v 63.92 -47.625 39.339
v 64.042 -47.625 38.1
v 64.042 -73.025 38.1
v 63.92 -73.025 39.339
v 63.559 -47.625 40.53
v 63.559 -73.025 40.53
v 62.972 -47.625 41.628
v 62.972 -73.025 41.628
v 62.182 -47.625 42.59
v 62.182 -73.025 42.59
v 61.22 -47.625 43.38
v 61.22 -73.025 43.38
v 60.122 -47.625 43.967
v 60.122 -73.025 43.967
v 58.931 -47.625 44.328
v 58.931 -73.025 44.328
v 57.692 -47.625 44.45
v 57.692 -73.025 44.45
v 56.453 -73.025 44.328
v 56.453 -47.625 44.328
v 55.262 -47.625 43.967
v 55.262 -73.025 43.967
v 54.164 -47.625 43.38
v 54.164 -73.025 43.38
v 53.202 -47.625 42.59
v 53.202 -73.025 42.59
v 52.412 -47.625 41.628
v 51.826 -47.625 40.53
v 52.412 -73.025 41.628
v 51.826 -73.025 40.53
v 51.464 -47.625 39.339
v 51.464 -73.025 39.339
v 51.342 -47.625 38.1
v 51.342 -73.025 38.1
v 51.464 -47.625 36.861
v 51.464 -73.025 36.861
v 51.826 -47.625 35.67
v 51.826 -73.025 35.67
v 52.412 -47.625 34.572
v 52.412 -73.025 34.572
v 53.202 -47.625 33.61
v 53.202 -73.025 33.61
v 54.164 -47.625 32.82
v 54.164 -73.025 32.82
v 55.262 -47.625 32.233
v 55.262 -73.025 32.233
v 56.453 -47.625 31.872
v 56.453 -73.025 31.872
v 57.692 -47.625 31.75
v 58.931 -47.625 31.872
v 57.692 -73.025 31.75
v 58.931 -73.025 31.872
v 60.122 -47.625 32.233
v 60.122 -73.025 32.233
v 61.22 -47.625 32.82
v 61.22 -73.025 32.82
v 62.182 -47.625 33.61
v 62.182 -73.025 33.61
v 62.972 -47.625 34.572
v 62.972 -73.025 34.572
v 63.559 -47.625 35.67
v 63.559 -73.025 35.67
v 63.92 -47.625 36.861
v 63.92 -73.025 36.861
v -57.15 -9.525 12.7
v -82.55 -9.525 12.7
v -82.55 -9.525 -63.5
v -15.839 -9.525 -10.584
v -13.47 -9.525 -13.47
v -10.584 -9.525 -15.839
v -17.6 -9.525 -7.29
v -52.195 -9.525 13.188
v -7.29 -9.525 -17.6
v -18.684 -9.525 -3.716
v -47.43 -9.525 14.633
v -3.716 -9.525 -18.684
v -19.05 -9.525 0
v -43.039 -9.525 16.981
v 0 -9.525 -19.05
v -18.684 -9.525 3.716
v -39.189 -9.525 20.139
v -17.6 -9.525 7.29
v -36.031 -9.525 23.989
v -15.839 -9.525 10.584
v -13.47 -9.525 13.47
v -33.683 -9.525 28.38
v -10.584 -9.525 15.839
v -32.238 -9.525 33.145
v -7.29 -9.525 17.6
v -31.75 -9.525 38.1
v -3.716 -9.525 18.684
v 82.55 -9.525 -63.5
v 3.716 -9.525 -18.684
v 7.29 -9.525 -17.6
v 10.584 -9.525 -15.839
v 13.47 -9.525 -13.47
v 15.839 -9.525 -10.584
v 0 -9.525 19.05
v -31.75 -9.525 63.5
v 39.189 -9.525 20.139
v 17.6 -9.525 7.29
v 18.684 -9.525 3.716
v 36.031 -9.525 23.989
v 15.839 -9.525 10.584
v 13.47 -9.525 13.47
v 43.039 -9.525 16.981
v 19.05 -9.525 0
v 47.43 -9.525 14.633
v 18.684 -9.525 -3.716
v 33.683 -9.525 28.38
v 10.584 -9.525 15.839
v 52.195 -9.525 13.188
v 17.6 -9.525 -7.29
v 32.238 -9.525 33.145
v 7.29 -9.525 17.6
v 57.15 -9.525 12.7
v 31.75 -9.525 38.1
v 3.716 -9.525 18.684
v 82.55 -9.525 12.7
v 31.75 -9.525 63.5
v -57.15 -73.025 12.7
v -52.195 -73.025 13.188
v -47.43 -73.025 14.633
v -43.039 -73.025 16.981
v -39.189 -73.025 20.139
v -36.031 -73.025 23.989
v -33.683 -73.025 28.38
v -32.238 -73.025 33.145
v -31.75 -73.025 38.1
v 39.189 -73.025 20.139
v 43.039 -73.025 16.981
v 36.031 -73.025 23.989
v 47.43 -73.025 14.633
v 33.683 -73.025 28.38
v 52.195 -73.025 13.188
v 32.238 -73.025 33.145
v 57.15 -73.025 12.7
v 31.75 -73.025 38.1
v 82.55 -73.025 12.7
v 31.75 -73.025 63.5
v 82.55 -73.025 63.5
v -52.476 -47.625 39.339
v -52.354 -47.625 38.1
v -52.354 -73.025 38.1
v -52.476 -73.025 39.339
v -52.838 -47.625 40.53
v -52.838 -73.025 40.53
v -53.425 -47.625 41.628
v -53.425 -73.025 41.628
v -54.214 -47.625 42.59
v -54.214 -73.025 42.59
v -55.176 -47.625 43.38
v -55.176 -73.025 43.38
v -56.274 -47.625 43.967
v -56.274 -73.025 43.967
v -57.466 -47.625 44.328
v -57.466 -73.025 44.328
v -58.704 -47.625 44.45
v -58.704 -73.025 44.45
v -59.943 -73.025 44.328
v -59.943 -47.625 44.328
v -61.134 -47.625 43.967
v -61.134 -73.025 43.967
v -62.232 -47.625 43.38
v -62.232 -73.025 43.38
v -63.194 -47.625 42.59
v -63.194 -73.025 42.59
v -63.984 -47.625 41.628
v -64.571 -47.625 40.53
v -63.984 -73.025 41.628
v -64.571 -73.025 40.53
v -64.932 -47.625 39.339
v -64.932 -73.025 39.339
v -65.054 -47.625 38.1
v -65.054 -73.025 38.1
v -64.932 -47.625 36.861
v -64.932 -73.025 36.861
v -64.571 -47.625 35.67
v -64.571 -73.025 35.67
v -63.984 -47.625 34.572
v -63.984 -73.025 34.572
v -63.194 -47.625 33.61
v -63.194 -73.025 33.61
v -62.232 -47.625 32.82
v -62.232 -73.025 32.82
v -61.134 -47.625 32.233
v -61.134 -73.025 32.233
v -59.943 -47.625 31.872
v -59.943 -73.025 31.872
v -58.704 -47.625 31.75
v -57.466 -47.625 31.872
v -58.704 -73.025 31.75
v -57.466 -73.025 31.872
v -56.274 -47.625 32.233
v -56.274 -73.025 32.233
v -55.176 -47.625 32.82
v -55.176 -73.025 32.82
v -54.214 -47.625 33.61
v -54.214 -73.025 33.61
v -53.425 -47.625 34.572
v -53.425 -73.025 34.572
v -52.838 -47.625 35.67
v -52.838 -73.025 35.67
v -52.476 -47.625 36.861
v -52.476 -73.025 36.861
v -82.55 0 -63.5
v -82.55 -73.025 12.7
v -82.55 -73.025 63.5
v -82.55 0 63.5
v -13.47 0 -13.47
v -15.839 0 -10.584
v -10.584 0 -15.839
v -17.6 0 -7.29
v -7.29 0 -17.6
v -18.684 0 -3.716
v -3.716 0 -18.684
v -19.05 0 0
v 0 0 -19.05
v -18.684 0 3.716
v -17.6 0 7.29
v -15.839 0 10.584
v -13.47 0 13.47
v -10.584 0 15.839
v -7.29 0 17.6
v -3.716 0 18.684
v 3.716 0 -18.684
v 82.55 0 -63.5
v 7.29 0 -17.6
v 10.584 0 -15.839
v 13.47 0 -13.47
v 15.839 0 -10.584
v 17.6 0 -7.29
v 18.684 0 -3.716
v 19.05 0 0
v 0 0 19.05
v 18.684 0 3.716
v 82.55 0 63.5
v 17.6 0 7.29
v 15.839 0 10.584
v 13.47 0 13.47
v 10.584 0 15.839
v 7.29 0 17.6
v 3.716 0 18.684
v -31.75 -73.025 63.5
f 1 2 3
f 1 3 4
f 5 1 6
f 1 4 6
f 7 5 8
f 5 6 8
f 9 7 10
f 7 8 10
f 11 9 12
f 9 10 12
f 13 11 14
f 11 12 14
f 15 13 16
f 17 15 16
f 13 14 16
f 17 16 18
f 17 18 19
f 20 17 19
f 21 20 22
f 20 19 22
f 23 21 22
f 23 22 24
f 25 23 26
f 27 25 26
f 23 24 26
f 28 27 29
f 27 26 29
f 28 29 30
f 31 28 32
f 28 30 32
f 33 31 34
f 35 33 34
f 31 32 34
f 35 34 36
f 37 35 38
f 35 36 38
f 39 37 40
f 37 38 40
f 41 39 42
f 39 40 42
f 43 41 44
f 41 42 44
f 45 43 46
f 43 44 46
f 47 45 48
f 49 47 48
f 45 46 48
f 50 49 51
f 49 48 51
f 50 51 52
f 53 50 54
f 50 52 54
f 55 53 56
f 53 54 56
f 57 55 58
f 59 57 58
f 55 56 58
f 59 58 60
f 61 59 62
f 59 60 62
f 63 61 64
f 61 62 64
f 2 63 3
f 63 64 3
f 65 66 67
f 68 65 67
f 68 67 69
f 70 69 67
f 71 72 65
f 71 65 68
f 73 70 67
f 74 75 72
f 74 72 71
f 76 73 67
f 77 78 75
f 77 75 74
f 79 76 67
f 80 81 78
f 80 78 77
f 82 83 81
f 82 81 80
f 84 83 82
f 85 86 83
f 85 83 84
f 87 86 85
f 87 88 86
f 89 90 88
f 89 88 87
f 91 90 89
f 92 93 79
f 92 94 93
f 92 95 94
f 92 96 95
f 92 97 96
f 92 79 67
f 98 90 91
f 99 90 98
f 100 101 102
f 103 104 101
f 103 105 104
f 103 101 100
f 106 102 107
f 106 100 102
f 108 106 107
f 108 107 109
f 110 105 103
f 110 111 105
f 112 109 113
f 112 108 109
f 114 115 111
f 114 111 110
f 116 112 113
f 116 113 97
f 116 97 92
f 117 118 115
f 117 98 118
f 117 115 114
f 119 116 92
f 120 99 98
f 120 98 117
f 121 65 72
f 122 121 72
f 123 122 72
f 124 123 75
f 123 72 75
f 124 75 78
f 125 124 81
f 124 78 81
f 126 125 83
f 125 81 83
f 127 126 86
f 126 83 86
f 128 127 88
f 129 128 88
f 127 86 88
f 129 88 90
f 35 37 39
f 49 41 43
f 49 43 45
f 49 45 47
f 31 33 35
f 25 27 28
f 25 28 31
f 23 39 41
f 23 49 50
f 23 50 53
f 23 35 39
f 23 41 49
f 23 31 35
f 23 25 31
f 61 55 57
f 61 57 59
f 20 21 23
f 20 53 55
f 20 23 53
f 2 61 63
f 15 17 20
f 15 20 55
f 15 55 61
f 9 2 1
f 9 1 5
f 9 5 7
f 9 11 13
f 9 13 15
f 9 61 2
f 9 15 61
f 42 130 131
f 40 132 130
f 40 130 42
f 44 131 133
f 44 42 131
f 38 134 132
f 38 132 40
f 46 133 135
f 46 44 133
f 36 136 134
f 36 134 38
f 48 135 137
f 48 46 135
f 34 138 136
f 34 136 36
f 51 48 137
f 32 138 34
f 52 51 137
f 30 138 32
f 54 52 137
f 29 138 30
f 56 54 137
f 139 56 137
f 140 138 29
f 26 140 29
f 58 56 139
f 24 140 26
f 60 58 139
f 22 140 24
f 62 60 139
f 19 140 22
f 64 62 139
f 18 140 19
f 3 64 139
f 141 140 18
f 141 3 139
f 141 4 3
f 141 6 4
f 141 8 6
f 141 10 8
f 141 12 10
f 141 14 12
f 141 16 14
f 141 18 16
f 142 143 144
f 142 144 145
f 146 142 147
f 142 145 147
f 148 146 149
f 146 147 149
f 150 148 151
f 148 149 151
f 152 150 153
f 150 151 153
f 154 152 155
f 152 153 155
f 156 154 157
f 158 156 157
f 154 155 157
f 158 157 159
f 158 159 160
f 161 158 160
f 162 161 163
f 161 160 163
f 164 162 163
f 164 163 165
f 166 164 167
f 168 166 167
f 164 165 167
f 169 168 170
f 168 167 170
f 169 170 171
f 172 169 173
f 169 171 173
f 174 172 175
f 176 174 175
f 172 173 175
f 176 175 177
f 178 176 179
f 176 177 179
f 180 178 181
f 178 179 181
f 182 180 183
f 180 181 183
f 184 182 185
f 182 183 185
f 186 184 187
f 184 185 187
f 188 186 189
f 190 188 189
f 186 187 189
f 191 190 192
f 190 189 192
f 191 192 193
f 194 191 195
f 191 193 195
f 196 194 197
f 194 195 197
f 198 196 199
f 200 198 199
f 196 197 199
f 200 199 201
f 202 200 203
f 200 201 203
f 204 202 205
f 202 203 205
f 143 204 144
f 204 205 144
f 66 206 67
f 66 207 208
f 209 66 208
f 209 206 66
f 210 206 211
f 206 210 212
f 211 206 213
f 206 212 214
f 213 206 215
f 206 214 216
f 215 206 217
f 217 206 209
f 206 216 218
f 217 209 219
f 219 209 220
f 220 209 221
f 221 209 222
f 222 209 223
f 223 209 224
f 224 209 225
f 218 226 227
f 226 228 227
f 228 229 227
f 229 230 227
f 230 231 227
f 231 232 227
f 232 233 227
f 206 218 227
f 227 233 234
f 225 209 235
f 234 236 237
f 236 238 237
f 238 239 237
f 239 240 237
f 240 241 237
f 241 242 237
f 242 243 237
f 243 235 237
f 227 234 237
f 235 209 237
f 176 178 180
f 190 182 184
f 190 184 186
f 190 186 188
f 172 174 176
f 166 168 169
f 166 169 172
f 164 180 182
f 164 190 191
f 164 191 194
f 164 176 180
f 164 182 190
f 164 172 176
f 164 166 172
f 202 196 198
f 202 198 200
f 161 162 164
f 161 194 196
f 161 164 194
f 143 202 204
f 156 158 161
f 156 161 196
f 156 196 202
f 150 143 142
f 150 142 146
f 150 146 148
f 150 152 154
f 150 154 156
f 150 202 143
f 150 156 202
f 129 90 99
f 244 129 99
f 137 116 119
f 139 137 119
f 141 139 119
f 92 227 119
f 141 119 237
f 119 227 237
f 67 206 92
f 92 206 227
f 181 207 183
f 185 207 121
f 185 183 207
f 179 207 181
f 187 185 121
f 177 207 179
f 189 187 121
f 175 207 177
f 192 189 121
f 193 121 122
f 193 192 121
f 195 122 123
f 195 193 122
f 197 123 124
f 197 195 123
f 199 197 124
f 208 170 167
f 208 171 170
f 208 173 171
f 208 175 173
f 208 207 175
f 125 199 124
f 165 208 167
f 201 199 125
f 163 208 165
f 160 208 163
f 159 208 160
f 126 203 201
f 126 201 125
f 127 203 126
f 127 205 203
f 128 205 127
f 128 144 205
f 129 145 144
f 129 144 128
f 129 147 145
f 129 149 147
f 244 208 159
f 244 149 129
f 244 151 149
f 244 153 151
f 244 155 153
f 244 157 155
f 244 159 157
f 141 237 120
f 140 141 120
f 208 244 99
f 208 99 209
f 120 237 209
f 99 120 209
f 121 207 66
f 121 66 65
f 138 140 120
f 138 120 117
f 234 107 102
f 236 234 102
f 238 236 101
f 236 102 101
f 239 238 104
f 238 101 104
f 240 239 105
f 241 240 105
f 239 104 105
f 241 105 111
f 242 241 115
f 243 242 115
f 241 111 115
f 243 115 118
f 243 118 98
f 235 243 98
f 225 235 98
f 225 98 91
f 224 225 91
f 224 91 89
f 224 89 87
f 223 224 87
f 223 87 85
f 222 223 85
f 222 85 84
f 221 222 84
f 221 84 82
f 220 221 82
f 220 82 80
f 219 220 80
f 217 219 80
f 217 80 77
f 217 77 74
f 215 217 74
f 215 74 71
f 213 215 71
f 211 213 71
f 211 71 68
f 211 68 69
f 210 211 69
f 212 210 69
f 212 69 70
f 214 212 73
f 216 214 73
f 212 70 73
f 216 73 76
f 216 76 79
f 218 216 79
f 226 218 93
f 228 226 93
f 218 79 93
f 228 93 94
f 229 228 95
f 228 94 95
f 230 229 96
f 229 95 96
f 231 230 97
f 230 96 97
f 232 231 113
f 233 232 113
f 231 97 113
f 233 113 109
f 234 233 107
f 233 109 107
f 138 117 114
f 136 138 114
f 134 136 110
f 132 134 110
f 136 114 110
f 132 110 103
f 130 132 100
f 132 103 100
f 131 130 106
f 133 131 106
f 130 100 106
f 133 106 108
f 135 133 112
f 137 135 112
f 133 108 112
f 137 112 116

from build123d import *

# Parameters (mm, degrees)
F0_W     = 165.1
F0_H     = 127
F1_DEPTH = 9.525
F3_DEPTH = 63.5
F4_R     = 19.05
F6_DEPTH = 50.8
F5_R     = 6.35
F7_DEPTH = 25.4
F8_R     = 6.35
F9_DEPTH = 25.4


with BuildPart() as f1:
    # F0 (on Front) → F1 (new body)
    with BuildSketch(Plane.XZ):
        Rectangle(F0_W, F0_H)
    extrude(amount=F1_DEPTH)

    # F2 (on face) → F3 (join)
    with BuildSketch(Plane.XZ.offset(9.525)):
        with BuildLine():
            Line((82.55, 63.5), (31.75, 63.5))
            Line((31.75, 63.5), (31.75, 38.1))
            ThreePointArc((31.75, 38.1), (39.189488, 20.139488), (57.15, 12.7))
            Line((57.15, 12.7), (82.55, 12.7))
            Line((82.55, 12.7), (82.55, 63.5))
        make_face()
        with BuildLine():
            Line((-31.75, 63.5), (-82.55, 63.5))
            Line((-82.55, 63.5), (-82.55, 12.7))
            Line((-82.55, 12.7), (-57.15, 12.7))
            ThreePointArc((-57.15, 12.7), (-39.189488, 20.139488), (-31.75, 38.1))
            Line((-31.75, 38.1), (-31.75, 63.5))
        make_face()
    extrude(amount=F3_DEPTH)

    # F4 (on face) → F6 (cut)
    with BuildSketch(Plane.XZ.offset(9.525)):
        Circle(F4_R)
    extrude(amount=-F6_DEPTH, mode=Mode.SUBTRACT)

    # F5 (on face) → F7 (cut)
    with BuildSketch(Plane.XZ.offset(73.025)):
        with Locations((-58.704365, 38.1)):
            Circle(F5_R)
    extrude(amount=-F7_DEPTH, mode=Mode.SUBTRACT)

    # F8 (on face) → F9 (cut)
    with BuildSketch(Plane.XZ.offset(73.025)):
        with Locations((57.692219, 38.1)):
            Circle(F8_R)
    extrude(amount=-F9_DEPTH, mode=Mode.SUBTRACT)


solid = f1.part
